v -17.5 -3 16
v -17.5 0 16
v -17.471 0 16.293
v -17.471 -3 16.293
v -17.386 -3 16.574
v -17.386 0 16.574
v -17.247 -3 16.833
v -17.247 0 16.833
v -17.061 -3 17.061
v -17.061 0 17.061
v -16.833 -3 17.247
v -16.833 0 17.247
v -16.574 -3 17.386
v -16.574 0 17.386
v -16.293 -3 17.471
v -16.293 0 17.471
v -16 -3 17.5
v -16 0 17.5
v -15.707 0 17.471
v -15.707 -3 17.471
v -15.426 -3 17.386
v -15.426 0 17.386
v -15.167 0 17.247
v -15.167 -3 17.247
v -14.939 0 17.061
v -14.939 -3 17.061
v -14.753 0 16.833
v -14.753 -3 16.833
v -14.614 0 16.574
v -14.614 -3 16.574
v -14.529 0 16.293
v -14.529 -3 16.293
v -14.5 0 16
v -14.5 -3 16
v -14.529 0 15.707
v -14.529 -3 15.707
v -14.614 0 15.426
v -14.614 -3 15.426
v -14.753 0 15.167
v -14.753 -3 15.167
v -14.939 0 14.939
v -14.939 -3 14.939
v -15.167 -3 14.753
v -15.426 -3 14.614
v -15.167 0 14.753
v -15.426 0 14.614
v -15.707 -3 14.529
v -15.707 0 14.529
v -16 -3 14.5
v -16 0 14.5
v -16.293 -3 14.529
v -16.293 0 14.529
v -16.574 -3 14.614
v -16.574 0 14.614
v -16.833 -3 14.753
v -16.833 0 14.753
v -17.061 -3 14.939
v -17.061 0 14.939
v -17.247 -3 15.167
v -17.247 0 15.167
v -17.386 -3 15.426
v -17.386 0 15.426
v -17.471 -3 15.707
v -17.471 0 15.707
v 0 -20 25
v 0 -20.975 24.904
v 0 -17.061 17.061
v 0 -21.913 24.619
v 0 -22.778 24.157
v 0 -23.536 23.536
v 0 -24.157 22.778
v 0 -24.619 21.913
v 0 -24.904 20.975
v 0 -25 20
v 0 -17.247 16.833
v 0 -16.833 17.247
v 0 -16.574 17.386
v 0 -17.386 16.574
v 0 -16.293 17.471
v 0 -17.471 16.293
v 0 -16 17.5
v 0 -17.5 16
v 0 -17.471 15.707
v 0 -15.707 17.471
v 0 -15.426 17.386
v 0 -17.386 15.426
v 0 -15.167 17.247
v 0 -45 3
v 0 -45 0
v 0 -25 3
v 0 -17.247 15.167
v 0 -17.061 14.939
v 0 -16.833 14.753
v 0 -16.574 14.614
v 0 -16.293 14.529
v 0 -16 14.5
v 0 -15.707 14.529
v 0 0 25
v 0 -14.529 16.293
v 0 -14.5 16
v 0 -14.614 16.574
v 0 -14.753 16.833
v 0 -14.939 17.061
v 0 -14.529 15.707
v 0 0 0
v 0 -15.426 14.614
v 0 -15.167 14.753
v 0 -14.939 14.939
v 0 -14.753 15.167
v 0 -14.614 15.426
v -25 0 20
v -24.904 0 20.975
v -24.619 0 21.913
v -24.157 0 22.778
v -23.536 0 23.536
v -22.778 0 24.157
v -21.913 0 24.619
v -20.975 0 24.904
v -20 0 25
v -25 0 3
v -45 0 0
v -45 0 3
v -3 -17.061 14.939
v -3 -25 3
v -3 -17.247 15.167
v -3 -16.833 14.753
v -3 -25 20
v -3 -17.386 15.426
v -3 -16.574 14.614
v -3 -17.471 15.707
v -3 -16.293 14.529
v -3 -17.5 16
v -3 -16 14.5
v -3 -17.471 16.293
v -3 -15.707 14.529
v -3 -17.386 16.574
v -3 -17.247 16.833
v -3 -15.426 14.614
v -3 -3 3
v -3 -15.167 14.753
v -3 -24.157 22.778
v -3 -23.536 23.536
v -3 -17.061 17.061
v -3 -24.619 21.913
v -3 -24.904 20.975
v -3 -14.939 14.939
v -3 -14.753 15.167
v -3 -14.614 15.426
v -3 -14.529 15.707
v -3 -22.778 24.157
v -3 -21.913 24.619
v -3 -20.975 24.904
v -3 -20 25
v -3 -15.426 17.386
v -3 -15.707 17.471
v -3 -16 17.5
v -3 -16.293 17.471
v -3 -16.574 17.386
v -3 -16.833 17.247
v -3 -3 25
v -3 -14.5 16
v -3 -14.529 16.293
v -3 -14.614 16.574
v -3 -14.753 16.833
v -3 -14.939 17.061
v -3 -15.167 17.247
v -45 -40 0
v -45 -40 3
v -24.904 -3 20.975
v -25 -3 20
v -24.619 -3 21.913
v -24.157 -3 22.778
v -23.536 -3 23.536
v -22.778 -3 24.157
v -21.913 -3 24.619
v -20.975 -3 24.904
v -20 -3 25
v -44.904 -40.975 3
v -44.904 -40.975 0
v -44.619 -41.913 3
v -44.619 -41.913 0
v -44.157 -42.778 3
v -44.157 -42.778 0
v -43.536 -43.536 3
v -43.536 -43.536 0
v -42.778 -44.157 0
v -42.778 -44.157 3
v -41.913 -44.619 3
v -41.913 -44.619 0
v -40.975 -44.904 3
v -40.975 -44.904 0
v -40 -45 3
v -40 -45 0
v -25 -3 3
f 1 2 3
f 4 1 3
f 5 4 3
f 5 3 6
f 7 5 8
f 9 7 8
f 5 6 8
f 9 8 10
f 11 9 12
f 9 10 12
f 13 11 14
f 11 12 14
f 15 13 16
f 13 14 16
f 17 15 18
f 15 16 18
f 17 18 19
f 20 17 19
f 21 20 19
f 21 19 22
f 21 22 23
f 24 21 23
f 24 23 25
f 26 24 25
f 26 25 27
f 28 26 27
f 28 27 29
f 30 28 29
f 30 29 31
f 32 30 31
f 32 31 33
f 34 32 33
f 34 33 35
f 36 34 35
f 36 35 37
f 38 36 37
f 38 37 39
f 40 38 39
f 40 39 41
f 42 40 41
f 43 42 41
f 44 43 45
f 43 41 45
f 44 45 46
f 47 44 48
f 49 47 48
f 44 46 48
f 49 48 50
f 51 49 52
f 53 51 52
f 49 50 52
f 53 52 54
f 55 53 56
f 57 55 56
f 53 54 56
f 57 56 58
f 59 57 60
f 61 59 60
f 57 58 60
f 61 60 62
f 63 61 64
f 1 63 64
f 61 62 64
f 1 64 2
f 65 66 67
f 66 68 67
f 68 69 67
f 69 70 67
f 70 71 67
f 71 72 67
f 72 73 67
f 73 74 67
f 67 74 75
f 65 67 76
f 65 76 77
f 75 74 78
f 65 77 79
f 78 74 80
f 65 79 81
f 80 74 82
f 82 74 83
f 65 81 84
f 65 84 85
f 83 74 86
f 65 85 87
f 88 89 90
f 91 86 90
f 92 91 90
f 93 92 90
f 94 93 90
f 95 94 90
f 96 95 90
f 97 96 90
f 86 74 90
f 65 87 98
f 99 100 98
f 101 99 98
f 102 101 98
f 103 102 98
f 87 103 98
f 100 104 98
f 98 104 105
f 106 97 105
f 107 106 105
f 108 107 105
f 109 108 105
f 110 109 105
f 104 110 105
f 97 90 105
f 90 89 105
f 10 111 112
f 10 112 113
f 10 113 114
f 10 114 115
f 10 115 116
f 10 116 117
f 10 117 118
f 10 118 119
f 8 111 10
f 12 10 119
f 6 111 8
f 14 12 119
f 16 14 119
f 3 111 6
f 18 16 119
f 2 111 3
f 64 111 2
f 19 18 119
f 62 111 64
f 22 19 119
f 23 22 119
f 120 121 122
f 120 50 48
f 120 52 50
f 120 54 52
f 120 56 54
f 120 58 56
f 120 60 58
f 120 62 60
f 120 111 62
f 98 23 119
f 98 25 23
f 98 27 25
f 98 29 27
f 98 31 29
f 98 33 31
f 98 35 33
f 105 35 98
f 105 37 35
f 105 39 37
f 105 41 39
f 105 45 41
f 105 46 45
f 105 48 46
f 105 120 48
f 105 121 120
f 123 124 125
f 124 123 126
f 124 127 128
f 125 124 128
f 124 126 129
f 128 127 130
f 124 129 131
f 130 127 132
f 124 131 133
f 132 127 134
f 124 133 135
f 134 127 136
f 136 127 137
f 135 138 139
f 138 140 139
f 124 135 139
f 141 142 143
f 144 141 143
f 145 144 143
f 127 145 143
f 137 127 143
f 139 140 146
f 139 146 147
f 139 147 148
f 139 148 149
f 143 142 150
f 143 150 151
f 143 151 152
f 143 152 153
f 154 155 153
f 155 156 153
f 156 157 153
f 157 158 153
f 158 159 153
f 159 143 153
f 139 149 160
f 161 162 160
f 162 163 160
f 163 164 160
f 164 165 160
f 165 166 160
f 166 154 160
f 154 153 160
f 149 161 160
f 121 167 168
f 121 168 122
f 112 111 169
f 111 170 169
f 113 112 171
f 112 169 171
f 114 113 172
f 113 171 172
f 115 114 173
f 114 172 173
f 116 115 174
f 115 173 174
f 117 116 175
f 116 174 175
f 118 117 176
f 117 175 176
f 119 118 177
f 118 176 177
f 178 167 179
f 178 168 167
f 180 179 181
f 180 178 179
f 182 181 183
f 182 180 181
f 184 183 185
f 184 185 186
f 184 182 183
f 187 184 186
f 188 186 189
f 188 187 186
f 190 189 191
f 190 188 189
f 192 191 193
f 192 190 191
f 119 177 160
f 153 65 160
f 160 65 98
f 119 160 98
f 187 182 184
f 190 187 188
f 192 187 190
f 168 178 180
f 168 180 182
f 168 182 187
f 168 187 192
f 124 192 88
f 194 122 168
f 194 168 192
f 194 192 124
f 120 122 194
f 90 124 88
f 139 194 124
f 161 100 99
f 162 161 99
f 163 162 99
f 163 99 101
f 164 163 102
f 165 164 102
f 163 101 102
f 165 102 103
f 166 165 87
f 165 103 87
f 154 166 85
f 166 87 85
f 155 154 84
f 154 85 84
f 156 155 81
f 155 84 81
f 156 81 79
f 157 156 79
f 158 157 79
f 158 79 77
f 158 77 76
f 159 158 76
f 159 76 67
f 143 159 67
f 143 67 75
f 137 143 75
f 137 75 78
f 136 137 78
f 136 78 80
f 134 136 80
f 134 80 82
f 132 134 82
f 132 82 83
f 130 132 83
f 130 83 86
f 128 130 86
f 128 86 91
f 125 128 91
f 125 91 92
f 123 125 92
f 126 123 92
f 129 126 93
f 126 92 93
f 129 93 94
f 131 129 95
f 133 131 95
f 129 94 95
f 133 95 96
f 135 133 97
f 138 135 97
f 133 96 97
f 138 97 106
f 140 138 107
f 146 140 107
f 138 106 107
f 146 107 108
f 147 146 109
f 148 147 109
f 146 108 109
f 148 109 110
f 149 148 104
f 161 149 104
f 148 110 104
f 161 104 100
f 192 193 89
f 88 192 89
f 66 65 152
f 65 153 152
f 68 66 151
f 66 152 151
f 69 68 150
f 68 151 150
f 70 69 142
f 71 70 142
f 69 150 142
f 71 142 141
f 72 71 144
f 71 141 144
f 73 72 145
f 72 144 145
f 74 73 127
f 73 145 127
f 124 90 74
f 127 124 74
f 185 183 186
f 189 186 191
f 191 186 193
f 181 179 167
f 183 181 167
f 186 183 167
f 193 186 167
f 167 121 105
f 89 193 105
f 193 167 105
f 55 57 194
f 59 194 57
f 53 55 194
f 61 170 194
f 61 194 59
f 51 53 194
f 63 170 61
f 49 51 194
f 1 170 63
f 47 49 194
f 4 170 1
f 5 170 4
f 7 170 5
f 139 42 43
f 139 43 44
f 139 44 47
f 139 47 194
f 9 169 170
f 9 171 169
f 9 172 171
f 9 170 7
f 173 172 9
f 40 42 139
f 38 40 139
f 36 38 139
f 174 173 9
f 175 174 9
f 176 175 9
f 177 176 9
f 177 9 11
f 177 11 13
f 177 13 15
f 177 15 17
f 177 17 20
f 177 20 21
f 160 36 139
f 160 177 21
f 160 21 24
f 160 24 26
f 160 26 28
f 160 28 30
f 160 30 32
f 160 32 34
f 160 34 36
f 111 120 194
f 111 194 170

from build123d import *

# Parameters (mm, degrees)
F0_W     = 45
F0_H     = 45
F3_DEPTH = 3
F4_R     = 5
F1_W     = 25
F1_H     = 25
F5_DEPTH = 3
F6_R     = 5
F2_W     = 25
F2_H     = 25
F7_DEPTH = 3
F8_R     = 5
F10_D    = 3
F12_D    = 3


with BuildPart() as f3:
    # F0 (on Top) → F3 (new body)
    with BuildSketch(Plane.XY):
        with Locations((-22.5, -22.5)):
            Rectangle(F0_W, F0_H)
    extrude(amount=F3_DEPTH)

    # F4
    f4_edges = [f3.edges().sort_by_distance(p)[0] for p in [
        (-45, -45, 1.5),
    ]]
    fillet(f4_edges, radius=F4_R)

    # F1 (on Right) → F5 (join)
    with BuildSketch(Plane.YZ):
        with Locations((-12.5, 12.5)):
            Rectangle(F1_W, F1_H)
    extrude(amount=-F5_DEPTH)

    # F6
    f6_edges = [f3.edges().sort_by_distance(p)[0] for p in [
        (-1.5, -25, 25),
    ]]
    fillet(f6_edges, radius=F6_R)

    # F2 (on Front) → F7 (join)
    with BuildSketch(Plane.XZ):
        with Locations((-12.5, 12.5)):
            Rectangle(F2_W, F2_H)
    extrude(amount=F7_DEPTH)

    # F8
    f8_edges = [f3.edges().sort_by_distance(p)[0] for p in [
        (-25, -1.5, 25),
    ]]
    fillet(f8_edges, radius=F8_R)

    # F10 (through all)
    with Locations(Plane.XZ.offset(3)):
        with Locations((-16, 16)):
            Hole(F10_D / 2)

    # F12 (through all)
    with Locations(Plane(origin=(-3, 0, 0), x_dir=(0, -1, 0), z_dir=(-1, 0, 0))):
        with Locations((16, 16)):
            Hole(F12_D / 2)


solid = f3.part
